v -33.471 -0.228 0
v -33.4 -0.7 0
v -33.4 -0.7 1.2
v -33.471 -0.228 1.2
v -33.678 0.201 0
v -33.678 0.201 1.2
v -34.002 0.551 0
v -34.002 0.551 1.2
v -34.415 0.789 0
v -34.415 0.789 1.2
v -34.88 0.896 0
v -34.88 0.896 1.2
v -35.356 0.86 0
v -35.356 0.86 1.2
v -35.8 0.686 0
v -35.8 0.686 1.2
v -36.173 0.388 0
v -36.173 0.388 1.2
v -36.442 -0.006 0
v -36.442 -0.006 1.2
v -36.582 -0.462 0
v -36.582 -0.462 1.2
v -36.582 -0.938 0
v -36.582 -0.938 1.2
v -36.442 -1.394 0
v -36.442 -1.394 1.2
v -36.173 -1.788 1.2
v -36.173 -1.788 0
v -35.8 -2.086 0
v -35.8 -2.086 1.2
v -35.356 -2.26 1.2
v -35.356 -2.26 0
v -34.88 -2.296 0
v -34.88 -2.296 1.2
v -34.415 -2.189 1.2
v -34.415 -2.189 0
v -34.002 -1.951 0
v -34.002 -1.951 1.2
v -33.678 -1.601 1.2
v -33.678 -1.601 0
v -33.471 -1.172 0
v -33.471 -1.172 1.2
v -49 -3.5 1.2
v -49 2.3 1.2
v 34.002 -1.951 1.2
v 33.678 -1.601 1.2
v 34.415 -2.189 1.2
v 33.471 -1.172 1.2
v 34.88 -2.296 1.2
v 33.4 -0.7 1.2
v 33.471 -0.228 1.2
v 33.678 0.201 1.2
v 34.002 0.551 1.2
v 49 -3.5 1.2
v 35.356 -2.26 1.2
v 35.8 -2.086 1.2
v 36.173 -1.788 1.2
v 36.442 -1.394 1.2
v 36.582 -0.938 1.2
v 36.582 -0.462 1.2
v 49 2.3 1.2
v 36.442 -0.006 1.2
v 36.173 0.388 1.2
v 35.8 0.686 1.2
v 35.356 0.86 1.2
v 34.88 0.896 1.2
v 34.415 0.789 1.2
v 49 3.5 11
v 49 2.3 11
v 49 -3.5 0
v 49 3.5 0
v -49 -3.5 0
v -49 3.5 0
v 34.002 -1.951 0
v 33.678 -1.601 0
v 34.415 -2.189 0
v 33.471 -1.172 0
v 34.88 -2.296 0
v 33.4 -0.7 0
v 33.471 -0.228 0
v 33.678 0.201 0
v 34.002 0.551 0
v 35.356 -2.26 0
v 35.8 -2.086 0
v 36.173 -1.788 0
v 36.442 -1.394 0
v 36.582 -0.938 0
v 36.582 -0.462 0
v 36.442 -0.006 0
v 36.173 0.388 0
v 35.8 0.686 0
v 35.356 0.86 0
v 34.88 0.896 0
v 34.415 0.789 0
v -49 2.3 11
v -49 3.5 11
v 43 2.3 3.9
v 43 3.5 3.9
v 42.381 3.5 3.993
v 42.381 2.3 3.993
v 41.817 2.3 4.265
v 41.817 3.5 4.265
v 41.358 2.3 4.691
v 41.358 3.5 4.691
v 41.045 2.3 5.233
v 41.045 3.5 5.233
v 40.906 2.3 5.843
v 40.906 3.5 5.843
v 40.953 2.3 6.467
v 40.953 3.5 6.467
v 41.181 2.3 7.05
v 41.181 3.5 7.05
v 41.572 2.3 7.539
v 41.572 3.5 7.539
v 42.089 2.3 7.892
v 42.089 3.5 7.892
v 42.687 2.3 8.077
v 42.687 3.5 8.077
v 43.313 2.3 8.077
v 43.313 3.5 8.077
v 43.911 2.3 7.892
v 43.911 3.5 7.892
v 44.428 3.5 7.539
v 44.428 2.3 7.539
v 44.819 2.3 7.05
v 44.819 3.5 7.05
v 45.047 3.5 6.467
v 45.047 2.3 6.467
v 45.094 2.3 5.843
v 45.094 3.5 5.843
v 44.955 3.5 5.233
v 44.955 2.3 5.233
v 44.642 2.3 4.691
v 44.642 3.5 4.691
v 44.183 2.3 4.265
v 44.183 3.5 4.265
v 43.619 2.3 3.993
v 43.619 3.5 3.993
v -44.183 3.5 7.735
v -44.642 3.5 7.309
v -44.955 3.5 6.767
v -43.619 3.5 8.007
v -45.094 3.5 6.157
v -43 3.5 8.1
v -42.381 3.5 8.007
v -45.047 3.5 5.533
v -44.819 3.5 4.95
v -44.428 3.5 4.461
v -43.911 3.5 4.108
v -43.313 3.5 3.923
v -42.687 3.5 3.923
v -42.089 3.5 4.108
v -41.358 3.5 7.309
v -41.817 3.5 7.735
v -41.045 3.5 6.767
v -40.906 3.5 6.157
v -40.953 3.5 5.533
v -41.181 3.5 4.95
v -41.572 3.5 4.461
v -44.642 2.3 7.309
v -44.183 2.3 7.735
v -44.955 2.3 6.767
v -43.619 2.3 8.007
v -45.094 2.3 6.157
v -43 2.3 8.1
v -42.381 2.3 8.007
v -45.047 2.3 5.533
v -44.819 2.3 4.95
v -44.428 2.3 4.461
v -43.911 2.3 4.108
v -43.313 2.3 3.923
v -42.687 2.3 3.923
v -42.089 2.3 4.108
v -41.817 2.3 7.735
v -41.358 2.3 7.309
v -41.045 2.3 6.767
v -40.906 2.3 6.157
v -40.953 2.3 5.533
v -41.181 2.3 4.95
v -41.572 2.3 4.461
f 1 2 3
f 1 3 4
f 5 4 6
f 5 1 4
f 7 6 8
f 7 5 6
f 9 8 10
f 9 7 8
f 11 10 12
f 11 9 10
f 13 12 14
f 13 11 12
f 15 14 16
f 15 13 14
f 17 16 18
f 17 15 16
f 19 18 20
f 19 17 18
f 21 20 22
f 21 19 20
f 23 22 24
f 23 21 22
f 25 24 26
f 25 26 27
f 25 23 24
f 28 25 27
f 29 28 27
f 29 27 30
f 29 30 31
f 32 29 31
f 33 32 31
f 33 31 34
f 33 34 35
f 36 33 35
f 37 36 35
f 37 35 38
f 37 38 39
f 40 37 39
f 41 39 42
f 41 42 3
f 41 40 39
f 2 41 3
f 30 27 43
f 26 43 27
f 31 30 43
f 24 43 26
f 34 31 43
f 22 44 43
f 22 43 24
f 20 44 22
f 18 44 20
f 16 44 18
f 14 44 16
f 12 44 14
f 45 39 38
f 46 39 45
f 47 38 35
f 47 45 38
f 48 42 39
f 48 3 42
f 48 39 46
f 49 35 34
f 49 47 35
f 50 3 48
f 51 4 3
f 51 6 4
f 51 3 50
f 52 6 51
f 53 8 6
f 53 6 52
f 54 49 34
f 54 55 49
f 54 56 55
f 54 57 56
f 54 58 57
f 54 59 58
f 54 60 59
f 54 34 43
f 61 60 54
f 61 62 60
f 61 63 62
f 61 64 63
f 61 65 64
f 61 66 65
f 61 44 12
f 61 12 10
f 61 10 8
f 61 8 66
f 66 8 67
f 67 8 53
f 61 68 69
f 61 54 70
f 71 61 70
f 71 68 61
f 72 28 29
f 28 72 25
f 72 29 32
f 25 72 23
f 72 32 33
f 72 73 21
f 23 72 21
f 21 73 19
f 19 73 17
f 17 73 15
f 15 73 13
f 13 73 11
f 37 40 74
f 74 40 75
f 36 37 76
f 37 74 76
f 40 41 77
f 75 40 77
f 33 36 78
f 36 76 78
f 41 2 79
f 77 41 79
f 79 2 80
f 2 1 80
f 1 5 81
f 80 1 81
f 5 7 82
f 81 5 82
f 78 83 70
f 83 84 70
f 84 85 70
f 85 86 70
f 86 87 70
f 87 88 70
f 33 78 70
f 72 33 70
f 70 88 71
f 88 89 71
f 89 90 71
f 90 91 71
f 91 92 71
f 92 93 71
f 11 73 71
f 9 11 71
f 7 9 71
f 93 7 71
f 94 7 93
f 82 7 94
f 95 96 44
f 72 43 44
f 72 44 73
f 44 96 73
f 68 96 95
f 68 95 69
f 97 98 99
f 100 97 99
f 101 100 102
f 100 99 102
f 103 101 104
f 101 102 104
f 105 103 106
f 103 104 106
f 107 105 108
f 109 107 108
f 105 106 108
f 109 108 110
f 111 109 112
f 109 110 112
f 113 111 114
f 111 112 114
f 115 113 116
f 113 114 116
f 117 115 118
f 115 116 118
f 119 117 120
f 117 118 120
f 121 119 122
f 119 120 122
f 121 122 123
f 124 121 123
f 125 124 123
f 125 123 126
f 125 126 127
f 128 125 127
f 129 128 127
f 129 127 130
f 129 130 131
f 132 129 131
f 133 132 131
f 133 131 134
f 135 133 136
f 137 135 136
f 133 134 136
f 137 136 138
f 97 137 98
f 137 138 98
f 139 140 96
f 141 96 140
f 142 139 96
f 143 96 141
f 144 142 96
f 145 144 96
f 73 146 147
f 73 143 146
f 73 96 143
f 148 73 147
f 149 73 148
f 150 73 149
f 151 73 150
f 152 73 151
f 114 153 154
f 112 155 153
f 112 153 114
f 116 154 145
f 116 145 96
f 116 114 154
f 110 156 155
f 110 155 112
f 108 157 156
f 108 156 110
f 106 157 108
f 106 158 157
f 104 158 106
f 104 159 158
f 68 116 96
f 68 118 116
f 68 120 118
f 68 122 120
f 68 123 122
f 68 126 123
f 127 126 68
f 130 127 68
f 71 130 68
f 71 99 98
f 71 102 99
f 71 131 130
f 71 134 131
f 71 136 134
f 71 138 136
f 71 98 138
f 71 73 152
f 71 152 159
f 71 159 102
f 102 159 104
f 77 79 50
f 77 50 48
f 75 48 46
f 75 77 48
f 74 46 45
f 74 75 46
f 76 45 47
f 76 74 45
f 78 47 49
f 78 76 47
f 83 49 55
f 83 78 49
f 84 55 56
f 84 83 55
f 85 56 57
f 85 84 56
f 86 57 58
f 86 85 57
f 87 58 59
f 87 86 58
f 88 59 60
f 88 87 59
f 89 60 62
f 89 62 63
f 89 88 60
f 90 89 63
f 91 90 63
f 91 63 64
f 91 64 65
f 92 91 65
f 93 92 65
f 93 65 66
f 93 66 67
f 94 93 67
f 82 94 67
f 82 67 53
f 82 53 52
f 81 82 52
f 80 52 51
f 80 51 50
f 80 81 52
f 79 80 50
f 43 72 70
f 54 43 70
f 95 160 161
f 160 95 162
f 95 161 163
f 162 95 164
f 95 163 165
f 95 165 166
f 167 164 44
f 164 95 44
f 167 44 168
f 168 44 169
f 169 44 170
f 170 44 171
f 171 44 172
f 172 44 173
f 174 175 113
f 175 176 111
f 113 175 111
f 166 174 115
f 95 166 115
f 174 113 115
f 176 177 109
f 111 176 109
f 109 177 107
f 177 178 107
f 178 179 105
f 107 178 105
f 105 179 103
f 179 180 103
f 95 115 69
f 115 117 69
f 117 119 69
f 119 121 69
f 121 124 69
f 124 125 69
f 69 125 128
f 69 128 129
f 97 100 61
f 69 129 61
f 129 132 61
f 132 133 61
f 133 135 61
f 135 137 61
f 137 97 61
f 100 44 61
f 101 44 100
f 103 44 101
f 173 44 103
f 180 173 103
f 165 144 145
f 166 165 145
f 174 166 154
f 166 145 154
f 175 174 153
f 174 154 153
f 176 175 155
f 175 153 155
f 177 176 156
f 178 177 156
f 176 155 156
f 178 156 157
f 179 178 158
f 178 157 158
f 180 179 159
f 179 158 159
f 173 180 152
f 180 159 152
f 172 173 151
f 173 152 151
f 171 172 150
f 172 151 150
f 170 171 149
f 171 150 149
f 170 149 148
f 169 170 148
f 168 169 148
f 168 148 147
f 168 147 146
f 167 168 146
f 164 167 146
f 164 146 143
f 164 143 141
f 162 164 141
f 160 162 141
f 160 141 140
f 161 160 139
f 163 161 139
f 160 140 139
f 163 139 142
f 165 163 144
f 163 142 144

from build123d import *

# Parameters (mm, degrees)
SKETCH1_W           = 98
SKETCH1_H           = 7
SKETCH1_R           = 1.6
BOSS_EXTRUDE1_DEPTH = 1.2
SKETCH2_W           = 98
SKETCH2_H           = 9.8
SKETCH2_R           = 2.1
BOSS_EXTRUDE2_DEPTH = 1.2


with BuildPart() as part:
    # Sketch1 → Boss-Extrude1 (new body)
    with BuildSketch(Plane.XY):
        Rectangle(SKETCH1_W, SKETCH1_H)
        with Locations((-35, -0.7)):
            Circle(SKETCH1_R, mode=Mode.SUBTRACT)
        with Locations(Location((35, -0.7, 0), (0, 0, 180))):
            Circle(SKETCH1_R, mode=Mode.SUBTRACT)
    extrude(amount=BOSS_EXTRUDE1_DEPTH)

    # Sketch2 → Boss-Extrude2 (add)
    with BuildSketch(Plane(origin=(0, 3.5, 0), x_dir=(1, 0, 0), z_dir=(0, 1, 0))):
        with Locations((0, -6.1)):
            Rectangle(SKETCH2_W, SKETCH2_H)
        with Locations(Location((-43, -6, 0), (0, 0, 270))):
            Circle(SKETCH2_R, mode=Mode.SUBTRACT)
        with Locations(Location((43, -6, 0), (0, 0, 90))):
            Circle(SKETCH2_R, mode=Mode.SUBTRACT)
    extrude(amount=-BOSS_EXTRUDE2_DEPTH)


solid = part.part
